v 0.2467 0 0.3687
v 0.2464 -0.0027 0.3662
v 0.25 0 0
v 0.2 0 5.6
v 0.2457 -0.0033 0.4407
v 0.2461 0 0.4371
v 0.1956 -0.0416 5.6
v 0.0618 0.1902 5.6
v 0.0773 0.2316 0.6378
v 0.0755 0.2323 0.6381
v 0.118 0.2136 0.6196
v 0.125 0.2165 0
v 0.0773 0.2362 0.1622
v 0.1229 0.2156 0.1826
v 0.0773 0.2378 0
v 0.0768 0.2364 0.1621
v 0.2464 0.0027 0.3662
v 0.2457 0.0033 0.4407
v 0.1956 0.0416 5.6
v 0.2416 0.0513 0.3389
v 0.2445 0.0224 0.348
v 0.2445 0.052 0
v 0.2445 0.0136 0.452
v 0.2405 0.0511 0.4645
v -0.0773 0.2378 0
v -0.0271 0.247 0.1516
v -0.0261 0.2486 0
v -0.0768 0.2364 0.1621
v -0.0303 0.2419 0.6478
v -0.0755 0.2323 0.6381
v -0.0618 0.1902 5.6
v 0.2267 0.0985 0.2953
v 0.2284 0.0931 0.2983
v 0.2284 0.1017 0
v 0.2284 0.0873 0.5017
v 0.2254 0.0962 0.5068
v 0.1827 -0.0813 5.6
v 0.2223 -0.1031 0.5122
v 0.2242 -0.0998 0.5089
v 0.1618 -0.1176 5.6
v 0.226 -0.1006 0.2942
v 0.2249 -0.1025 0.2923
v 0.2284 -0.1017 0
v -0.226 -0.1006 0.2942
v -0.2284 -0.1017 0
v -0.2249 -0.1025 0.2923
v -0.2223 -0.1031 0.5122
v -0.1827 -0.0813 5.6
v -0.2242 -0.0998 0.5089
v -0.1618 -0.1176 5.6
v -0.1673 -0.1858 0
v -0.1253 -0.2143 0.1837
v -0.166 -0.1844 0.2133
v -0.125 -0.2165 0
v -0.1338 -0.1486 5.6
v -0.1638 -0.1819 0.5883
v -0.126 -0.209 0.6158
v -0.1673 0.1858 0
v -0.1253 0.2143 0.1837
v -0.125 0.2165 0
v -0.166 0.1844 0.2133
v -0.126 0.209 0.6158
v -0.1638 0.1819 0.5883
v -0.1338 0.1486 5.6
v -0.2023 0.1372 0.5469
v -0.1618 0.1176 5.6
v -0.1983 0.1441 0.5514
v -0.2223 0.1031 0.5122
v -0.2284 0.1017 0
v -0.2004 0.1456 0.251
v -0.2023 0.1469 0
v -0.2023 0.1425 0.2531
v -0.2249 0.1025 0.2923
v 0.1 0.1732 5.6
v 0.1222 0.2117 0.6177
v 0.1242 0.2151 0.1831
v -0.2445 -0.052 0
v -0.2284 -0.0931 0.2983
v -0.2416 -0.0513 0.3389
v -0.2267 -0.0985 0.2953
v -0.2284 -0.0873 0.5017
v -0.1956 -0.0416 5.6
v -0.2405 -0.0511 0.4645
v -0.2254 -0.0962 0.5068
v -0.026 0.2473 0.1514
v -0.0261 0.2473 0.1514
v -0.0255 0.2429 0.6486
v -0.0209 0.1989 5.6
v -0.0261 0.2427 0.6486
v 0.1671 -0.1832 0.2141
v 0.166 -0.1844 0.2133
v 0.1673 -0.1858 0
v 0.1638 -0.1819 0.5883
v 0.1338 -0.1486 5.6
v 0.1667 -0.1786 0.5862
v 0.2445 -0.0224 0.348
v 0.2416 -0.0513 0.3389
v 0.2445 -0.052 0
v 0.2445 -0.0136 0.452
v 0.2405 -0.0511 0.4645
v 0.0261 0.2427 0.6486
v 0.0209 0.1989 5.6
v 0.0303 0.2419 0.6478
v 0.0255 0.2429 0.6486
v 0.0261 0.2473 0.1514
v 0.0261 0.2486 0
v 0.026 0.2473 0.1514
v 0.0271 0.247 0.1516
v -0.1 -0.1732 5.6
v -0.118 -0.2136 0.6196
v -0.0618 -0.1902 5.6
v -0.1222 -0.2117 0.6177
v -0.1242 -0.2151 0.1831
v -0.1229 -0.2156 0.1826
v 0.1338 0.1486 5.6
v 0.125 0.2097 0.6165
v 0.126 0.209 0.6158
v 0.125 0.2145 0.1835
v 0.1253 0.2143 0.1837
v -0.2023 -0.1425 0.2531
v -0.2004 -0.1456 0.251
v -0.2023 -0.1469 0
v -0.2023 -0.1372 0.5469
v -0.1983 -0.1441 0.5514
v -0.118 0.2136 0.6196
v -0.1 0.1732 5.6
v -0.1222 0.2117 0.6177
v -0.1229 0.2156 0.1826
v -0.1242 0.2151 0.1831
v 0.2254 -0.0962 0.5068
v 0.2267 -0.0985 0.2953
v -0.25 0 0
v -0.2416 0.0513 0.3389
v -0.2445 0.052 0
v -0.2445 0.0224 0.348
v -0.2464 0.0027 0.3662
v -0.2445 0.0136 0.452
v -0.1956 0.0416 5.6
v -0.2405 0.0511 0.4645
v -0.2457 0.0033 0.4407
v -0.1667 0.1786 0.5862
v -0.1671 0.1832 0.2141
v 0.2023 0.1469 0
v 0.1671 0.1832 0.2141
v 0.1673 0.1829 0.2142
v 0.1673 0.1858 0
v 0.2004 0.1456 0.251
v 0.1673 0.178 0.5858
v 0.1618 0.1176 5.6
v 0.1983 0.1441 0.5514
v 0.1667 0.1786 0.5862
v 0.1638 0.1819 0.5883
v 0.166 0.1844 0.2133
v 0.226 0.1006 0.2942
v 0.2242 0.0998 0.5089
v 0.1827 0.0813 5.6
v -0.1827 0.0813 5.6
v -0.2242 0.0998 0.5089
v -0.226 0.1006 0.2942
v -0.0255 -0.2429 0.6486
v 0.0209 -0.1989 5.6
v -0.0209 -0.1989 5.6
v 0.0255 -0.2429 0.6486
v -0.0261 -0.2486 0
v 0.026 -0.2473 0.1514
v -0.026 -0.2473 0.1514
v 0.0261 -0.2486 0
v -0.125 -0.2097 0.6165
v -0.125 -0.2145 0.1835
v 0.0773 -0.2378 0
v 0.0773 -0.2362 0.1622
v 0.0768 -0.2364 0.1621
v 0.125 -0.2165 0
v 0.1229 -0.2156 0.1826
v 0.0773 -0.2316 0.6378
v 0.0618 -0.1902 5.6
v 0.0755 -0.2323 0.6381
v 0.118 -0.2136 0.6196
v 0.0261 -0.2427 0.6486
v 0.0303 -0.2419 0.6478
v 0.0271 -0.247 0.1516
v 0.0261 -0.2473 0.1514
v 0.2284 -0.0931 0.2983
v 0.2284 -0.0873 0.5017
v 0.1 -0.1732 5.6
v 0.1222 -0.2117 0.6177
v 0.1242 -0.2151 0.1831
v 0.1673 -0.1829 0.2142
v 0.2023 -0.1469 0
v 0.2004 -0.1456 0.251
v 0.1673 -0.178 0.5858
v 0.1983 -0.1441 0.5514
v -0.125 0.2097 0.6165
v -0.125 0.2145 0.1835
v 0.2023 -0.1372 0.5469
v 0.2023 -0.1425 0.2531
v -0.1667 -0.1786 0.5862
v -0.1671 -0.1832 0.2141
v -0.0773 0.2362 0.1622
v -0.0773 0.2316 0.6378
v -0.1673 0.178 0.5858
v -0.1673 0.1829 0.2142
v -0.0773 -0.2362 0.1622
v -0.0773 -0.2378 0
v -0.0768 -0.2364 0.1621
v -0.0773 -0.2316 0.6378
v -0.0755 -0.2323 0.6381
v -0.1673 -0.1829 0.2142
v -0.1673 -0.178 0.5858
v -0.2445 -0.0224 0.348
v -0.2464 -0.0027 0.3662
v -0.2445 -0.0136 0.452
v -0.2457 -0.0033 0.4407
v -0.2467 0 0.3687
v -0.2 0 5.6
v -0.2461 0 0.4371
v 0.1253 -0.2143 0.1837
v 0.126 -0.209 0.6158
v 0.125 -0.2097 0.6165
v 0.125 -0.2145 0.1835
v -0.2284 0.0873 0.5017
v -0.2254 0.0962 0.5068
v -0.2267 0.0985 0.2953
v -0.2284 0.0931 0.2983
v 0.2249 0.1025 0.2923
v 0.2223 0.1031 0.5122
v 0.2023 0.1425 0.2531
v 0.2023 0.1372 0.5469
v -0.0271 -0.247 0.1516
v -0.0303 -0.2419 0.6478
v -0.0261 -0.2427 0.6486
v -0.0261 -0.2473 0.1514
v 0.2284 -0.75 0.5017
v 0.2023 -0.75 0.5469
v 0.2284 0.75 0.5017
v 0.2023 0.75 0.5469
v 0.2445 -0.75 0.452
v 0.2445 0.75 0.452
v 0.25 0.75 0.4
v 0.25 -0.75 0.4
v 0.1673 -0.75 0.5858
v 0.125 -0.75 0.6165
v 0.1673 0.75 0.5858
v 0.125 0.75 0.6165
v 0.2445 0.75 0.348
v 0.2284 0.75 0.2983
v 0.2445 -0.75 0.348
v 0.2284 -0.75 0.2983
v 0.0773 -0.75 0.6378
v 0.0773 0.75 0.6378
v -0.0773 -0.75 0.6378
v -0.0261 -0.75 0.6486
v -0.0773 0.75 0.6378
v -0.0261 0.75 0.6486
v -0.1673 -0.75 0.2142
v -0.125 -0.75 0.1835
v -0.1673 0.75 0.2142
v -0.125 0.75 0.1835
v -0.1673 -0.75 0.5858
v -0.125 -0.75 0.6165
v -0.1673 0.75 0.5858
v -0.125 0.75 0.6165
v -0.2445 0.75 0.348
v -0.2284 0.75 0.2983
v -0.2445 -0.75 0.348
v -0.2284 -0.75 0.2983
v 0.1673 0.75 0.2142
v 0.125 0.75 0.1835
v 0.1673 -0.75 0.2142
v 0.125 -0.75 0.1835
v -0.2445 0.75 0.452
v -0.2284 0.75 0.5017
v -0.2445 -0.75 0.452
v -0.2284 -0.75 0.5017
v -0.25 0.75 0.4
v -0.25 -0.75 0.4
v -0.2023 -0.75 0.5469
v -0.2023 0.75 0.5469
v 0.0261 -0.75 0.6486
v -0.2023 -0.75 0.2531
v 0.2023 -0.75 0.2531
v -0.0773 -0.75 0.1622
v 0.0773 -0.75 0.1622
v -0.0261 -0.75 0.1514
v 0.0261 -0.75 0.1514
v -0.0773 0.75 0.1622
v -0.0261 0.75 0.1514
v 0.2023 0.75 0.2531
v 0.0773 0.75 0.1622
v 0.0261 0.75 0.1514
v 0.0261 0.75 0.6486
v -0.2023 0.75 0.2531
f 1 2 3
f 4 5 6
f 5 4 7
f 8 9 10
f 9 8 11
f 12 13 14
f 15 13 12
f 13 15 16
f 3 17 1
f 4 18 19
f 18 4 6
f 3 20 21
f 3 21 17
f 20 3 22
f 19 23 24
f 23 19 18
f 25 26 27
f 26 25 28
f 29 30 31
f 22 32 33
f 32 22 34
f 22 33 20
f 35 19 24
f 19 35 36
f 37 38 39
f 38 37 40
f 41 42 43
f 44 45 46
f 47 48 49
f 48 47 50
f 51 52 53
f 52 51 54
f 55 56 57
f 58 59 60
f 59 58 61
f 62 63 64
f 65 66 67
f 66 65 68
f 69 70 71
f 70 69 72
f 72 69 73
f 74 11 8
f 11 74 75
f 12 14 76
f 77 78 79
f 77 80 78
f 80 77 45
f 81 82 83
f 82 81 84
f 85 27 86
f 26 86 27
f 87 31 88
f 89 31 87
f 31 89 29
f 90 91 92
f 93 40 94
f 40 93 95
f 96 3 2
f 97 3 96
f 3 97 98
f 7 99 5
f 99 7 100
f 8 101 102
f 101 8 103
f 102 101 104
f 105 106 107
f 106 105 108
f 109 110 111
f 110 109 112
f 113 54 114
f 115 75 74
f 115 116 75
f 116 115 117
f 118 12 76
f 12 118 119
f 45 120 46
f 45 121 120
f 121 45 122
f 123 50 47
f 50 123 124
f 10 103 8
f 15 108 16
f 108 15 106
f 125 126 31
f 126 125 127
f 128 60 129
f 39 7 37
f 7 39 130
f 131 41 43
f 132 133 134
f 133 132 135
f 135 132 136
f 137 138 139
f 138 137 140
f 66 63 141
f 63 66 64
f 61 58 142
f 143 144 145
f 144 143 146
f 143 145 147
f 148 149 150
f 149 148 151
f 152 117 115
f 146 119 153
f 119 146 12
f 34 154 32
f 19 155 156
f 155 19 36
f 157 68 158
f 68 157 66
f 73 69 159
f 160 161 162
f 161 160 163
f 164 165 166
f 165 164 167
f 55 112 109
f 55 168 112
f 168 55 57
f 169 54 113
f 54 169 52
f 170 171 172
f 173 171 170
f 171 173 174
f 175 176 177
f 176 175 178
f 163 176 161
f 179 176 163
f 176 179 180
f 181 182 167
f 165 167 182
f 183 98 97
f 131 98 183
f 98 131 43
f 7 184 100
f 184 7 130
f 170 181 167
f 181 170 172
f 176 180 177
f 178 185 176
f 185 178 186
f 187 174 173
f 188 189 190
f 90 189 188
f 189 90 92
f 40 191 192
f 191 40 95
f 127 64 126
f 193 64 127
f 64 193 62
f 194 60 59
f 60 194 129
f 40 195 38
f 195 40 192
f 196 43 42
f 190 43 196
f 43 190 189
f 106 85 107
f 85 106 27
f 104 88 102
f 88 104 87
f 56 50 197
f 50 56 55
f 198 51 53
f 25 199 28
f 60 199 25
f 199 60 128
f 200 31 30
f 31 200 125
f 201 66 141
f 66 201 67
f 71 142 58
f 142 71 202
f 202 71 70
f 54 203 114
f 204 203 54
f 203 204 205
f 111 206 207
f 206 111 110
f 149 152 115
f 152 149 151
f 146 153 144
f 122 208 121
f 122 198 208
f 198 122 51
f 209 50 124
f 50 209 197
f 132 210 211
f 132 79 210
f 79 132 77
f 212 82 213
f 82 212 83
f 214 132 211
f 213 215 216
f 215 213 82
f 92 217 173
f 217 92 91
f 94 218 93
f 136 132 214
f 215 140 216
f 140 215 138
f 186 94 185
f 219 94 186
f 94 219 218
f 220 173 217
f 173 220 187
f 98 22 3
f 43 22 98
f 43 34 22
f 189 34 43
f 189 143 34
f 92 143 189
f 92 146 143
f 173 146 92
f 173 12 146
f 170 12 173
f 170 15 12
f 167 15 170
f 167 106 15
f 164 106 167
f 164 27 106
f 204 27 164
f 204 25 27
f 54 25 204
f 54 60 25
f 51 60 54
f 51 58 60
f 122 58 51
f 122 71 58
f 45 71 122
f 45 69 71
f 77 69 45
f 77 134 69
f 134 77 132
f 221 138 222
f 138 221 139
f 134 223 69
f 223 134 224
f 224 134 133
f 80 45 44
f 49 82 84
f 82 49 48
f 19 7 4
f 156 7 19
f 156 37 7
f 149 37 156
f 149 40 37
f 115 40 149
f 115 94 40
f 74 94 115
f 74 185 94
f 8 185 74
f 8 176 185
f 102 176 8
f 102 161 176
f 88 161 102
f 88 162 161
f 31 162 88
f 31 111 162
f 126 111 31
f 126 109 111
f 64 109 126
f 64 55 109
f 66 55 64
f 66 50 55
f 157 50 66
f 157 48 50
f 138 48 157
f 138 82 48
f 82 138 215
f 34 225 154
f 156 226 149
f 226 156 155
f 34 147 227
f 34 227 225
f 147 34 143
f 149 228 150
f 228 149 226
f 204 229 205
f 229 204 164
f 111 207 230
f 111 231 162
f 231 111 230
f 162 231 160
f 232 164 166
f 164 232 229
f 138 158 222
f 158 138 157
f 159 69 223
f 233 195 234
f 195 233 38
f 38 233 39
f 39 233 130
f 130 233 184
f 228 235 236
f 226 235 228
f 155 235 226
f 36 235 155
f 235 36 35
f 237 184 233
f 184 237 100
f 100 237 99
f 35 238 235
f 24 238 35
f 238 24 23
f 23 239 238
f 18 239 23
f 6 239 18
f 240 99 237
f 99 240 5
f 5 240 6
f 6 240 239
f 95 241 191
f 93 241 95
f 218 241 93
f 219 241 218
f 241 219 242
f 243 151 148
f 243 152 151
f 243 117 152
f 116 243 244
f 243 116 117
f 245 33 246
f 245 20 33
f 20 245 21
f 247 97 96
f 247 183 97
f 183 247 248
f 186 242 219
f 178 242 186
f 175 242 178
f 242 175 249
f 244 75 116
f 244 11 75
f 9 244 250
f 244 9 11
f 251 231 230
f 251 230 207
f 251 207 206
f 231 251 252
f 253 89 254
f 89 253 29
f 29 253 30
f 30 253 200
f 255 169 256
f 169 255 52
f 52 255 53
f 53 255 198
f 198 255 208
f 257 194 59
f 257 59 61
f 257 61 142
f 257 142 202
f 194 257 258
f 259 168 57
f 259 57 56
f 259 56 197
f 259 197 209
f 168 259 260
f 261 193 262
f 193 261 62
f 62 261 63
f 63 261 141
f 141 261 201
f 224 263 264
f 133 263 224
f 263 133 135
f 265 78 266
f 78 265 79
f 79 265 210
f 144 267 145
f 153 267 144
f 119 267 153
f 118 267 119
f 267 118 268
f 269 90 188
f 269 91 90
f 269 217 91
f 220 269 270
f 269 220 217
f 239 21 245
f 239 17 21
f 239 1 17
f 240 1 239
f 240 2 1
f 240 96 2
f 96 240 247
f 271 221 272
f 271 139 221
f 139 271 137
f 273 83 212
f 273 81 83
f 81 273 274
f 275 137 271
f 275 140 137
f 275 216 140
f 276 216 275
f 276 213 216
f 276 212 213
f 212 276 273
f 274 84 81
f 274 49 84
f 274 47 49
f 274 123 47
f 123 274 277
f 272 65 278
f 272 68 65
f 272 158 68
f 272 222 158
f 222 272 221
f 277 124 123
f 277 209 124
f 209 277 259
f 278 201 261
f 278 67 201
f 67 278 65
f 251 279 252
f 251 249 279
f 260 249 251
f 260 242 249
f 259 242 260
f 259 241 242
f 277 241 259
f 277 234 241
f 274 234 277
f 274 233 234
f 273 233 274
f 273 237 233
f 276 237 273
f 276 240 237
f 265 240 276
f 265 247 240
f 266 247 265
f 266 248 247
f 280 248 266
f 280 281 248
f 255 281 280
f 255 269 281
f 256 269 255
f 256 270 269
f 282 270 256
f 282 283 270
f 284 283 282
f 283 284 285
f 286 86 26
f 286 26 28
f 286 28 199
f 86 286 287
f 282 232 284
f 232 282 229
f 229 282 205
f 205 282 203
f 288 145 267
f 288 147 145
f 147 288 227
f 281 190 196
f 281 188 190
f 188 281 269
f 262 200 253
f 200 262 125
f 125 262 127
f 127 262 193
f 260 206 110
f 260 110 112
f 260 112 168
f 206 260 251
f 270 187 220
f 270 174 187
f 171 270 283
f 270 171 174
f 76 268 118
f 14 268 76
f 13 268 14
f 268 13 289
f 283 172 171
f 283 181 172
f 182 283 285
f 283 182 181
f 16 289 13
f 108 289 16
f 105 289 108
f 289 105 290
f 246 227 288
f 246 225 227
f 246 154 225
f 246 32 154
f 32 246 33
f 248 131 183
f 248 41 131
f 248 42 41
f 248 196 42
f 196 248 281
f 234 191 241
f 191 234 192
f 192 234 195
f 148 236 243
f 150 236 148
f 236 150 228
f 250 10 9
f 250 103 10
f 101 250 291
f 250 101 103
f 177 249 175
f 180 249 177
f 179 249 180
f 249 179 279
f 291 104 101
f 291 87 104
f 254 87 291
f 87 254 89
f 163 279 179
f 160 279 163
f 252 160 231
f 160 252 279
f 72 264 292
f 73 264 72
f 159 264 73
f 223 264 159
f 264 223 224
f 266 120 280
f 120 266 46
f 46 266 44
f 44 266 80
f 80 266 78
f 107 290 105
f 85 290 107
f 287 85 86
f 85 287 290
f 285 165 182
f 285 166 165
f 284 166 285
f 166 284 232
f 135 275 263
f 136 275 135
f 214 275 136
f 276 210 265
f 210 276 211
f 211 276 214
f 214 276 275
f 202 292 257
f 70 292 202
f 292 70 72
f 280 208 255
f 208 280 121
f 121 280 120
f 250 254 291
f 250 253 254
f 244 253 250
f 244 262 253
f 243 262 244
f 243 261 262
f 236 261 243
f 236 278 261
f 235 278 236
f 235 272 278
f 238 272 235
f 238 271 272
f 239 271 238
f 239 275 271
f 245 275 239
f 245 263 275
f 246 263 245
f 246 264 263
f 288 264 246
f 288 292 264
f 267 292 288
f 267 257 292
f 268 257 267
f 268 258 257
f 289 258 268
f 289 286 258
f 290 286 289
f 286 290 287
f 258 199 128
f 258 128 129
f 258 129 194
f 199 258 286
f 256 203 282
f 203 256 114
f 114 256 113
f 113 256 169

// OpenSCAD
cylinder(r1=.25, r2=.2, h=5.6, $fn=30);
translate([0,.75,.4])
rotate([90,0,0])
cylinder(r=.25, h=1.5, $fn=30);
